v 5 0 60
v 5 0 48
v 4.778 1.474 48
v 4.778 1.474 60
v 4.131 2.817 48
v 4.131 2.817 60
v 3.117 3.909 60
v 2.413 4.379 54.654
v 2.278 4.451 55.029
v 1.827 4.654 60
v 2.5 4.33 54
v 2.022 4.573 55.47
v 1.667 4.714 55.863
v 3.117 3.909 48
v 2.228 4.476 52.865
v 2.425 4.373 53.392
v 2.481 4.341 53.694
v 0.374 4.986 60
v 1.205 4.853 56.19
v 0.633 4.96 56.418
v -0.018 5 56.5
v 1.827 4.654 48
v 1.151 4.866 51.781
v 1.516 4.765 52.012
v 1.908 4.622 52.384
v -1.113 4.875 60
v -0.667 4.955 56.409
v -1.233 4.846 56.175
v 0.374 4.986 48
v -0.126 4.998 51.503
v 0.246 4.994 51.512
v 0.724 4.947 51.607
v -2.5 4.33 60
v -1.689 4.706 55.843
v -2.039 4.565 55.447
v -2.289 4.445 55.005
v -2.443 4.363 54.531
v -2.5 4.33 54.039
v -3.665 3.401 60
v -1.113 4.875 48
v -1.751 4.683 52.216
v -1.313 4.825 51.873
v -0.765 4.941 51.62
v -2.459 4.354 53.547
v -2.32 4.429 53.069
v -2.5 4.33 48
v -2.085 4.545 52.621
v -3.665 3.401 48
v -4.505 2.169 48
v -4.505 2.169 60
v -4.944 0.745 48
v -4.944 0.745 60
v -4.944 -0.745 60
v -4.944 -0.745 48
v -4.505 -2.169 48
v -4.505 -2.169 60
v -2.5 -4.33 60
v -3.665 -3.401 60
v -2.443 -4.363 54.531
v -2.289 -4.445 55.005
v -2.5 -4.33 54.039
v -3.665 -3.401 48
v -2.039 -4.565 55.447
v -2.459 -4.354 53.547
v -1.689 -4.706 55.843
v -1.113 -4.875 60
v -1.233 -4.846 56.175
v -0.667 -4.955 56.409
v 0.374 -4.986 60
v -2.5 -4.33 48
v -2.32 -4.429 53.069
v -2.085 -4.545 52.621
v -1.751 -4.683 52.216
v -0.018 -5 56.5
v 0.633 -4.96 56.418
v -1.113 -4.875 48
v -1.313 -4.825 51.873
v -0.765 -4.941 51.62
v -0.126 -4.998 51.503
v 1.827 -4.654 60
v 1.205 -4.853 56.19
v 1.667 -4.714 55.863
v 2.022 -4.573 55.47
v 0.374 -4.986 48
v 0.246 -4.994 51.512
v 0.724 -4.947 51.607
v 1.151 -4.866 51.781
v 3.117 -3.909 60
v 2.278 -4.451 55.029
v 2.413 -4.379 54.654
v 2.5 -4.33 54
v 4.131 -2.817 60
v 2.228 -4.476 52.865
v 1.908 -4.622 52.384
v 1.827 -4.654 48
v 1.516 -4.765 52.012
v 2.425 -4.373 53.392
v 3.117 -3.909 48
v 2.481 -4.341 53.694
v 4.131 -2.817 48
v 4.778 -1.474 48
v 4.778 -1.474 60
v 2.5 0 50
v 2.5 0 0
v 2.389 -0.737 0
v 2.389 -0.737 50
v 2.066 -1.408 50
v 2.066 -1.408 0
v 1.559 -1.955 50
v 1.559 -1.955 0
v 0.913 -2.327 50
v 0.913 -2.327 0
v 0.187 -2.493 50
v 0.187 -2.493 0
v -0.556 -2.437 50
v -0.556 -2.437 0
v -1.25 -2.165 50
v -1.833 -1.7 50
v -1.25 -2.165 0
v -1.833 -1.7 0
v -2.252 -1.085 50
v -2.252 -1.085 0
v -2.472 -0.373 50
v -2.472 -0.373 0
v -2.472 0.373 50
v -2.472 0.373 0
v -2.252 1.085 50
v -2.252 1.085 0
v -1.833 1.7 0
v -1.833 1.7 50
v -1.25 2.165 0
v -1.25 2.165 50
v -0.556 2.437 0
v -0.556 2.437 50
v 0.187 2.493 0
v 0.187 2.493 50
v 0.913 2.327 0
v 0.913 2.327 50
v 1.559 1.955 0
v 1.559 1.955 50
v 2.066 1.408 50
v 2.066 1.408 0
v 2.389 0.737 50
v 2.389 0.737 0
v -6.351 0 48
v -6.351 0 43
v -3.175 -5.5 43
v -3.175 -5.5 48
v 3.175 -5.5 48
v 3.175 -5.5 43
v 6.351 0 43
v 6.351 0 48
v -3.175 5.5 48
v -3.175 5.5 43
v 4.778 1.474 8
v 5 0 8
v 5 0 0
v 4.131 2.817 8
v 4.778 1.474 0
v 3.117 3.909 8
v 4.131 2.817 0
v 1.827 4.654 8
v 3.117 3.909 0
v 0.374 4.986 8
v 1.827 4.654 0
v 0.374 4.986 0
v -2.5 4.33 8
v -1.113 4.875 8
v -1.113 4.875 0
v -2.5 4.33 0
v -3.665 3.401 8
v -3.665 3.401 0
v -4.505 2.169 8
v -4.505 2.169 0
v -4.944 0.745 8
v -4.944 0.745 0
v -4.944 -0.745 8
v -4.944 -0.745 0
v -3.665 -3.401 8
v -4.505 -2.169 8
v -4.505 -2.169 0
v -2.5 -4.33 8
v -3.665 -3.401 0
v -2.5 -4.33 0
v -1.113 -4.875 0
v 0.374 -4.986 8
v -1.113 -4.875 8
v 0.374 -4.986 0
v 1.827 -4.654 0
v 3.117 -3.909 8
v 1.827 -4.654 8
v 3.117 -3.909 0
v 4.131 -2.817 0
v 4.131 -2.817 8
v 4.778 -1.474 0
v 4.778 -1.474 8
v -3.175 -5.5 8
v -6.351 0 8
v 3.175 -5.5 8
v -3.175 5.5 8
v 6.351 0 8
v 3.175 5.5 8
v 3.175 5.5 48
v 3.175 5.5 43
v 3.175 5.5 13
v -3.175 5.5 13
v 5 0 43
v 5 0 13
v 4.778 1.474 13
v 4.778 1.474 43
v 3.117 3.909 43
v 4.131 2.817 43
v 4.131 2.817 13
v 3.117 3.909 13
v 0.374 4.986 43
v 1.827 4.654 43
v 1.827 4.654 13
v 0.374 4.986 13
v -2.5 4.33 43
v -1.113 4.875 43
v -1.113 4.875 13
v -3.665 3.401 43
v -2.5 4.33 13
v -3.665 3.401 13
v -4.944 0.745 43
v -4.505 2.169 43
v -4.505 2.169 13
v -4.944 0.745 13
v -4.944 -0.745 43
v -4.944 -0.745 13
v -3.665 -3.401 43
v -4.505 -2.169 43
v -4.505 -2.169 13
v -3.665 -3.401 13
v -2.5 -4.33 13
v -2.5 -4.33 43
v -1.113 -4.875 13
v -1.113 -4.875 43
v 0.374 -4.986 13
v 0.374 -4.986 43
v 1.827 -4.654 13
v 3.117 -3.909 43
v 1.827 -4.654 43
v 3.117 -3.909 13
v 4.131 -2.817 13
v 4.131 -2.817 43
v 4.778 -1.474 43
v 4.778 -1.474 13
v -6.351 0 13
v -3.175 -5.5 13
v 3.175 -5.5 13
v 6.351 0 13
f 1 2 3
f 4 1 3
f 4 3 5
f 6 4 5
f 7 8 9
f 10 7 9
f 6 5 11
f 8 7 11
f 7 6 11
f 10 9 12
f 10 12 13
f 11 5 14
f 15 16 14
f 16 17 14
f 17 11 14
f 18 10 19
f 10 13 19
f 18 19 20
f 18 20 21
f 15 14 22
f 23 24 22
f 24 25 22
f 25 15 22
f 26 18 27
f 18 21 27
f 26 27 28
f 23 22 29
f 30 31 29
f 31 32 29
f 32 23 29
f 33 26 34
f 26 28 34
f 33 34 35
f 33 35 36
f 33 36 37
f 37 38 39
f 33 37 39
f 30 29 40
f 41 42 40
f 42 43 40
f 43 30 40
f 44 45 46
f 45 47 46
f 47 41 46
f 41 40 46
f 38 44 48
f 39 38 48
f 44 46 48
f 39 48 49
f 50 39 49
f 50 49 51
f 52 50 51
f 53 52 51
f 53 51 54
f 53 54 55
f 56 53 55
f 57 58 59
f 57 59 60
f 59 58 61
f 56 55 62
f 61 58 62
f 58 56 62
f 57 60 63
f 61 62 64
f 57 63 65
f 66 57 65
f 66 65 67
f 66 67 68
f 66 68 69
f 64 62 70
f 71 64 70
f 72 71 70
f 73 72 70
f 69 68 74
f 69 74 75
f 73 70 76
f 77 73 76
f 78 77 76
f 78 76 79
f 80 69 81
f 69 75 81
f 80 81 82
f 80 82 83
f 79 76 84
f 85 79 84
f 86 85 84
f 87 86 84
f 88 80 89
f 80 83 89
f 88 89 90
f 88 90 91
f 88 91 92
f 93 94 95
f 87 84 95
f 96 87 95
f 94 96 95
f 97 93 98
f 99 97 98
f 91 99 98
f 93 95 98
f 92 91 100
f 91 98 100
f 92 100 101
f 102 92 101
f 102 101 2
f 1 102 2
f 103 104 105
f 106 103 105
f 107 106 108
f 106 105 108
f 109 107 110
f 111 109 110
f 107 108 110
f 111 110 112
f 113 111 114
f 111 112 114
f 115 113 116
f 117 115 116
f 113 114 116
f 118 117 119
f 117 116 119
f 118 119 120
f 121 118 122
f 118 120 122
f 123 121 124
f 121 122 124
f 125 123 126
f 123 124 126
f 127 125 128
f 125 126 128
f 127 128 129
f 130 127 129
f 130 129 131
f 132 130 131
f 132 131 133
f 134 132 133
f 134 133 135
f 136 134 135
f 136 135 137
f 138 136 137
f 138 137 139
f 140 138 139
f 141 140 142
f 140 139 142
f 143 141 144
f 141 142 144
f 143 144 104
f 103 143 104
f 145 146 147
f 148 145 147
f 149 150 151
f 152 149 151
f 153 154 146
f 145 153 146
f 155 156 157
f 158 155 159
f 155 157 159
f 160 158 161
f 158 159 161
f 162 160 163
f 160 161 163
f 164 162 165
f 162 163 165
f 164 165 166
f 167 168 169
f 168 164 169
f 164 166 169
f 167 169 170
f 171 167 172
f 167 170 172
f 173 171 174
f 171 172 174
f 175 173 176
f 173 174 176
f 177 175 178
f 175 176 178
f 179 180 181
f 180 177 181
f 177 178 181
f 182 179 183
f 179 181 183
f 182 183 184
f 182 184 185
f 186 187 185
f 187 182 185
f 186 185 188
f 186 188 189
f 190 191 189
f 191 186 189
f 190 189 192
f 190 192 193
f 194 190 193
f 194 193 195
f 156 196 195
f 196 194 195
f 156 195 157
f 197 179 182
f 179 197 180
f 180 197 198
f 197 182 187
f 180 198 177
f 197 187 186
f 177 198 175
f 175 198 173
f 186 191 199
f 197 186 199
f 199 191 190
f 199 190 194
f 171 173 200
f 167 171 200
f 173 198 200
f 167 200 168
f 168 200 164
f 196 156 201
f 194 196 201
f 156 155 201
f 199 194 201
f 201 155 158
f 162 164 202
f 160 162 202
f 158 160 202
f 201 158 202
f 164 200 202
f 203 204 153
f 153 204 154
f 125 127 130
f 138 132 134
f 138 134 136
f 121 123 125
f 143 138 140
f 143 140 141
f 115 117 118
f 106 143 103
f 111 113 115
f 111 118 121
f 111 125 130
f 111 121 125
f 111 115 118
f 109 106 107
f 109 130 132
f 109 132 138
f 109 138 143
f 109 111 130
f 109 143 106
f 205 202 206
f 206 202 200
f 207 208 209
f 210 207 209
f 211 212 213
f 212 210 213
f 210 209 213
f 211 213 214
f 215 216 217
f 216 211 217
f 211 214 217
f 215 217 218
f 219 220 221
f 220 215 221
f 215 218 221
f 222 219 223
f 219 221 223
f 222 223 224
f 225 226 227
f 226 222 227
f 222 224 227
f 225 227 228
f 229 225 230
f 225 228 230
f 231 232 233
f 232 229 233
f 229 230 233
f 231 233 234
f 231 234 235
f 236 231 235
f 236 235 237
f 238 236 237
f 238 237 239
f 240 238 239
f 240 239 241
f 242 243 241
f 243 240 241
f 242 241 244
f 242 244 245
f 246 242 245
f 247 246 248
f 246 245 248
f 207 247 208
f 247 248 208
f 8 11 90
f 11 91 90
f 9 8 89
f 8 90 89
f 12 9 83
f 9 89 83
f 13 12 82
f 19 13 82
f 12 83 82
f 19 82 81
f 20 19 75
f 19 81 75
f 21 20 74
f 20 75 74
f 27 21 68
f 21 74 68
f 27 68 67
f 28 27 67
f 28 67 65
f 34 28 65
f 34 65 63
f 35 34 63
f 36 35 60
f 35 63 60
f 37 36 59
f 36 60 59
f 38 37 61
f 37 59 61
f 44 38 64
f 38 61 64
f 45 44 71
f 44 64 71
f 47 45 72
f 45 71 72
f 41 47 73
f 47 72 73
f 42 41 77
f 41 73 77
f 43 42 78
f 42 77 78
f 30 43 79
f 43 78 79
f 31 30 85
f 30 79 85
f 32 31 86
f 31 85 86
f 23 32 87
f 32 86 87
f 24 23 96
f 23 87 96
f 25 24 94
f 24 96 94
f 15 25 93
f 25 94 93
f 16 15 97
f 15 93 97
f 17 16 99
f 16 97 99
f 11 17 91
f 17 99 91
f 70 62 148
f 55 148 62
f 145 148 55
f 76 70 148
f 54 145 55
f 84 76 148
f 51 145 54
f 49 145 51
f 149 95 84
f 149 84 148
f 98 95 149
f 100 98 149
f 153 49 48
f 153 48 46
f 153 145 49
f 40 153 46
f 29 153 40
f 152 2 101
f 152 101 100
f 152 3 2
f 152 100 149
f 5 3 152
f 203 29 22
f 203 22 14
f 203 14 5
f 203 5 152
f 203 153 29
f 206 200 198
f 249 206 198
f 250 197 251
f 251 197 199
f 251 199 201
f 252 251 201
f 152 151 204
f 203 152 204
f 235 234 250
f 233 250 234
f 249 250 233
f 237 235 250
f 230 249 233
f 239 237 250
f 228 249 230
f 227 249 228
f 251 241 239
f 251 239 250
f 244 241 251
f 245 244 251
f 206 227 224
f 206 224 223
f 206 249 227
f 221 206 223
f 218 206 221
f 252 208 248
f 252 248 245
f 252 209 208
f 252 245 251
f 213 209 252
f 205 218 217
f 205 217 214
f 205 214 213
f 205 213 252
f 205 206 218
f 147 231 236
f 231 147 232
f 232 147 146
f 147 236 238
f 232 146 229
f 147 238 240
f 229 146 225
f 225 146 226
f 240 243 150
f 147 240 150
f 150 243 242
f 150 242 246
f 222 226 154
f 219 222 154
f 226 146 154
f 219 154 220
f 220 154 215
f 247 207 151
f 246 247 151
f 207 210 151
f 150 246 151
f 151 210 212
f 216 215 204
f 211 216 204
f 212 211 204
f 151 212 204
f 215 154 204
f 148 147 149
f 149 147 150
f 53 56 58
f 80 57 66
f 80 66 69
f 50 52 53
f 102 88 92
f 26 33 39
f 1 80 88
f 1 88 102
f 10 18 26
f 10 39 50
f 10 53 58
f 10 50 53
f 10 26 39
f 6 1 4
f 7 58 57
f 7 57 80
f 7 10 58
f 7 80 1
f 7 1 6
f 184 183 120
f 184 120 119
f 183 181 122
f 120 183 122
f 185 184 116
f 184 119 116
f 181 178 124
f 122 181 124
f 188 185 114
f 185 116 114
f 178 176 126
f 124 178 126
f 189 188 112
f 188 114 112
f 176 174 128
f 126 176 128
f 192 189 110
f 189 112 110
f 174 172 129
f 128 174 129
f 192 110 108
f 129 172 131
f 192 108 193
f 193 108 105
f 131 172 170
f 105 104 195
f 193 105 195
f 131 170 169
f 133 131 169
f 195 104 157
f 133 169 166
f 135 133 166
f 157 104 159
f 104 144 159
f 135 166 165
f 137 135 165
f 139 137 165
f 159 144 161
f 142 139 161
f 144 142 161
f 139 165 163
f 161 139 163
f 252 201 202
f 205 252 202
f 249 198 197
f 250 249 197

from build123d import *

# Parameters (mm, degrees)
F0_R      = 5
F1_DEPTH  = 60
F4_DEPTH  = 5
F7_DEPTH  = 5
F8_R      = 2.5
F9_DEPTH  = 12.5
F10_R     = 2.5
F11_DEPTH = 50


with BuildPart() as f1:
    # F0 (on Top) → F1 (new body)
    with BuildSketch(Plane.XY):
        Circle(F0_R)
    extrude(amount=F1_DEPTH)

    # F3 (on offset) → F4 (join)
    with BuildSketch(Plane.XY.offset(8)):
        Polygon((3.175426, 5.5), (-3.175426, 5.5), (-6.350853, 0), (-3.175426, -5.5), (3.175426, -5.5), (6.350853, 0), align=None)
    extrude(amount=F4_DEPTH)

    # F6 (on offset) → F7 (join)
    with BuildSketch(Plane.XY.offset(43)):
        Polygon((3.175426, 5.5), (-3.175426, 5.5), (-6.350853, 0), (-3.175426, -5.5), (3.175426, -5.5), (6.350853, 0), align=None)
    extrude(amount=F7_DEPTH)

    # F8 (on Front) → F9 (cut, symmetric)
    with BuildSketch(Plane.XZ):
        with Locations((0, 54)):
            Circle(F8_R)
    extrude(amount=F9_DEPTH, both=True, mode=Mode.SUBTRACT)

    # F10 (on face) → F11 (cut)
    with BuildSketch(Plane(origin=(0, 0, 0), x_dir=(1, 0, 0), z_dir=(0, 0, -1))):
        Circle(F10_R)
    extrude(amount=-F11_DEPTH, mode=Mode.SUBTRACT)


solid = f1.part
